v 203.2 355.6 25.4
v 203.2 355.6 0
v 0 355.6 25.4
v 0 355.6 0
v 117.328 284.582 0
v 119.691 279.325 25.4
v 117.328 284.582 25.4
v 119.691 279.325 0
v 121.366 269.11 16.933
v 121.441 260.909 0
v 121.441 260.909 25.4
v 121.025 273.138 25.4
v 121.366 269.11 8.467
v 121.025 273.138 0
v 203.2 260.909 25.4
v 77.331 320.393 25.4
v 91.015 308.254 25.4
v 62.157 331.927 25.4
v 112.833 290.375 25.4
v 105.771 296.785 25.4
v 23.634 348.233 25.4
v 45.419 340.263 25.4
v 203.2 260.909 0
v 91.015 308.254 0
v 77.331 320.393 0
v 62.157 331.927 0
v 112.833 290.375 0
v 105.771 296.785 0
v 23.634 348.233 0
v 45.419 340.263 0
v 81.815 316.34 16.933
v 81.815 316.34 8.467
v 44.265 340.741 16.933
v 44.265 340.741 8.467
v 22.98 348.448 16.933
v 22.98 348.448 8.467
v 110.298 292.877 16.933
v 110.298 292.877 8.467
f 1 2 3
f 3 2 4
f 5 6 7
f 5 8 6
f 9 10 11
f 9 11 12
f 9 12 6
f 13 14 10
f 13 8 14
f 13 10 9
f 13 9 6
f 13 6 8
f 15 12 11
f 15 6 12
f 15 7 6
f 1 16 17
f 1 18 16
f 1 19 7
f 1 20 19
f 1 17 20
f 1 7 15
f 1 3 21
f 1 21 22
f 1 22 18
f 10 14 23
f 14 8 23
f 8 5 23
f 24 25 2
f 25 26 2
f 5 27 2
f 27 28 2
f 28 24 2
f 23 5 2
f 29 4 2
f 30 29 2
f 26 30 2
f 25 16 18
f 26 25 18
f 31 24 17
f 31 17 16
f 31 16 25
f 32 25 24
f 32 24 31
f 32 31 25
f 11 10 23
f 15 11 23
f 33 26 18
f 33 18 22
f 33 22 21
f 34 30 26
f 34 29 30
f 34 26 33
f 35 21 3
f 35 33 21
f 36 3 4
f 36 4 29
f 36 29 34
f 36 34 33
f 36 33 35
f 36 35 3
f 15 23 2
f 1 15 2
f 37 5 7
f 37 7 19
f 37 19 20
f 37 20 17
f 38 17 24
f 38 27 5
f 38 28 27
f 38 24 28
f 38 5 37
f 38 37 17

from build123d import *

# Parameters (mm, degrees)
F1_DEPTH = 25.4


with BuildPart() as f1:
    # F0 (on Top) → F1 (new body)
    with BuildSketch(Plane.XY):
        with BuildLine():
            Line((62.1568927622, 331.9272), (203.2, 331.9272))
            Line((203.2, 331.9272), (203.2, 355.6))
            Line((203.2, 355.6), (0, 355.6))
            add(Edge.make_bspline(
                [(62.1568927622, 331.9272), (46.5258539889, 341.4800694919), (23.2629269944, 348.540034746), (0, 355.6)],
                knots=[0.6752877262, 0.6752877262, 0.6752877262, 0.6752877262, 1, 1, 1, 1], degree=3))
        make_face()
        with BuildLine():
            Line((91.0151283785, 308.2544), (203.2, 308.2544))
            Line((203.2, 308.2544), (203.2, 331.9272))
            Line((203.2, 331.9272), (62.1568927622, 331.9272))
            add(Edge.make_bspline(
                [(91.0151283785, 308.2544), (81.293107614, 316.2156971088), (73.8664451152, 324.7709369352), (62.1568927622, 331.9272)],
                knots=[0.4320386737, 0.4320386737, 0.4320386737, 0.4320386737, 0.6752877262, 0.6752877262, 0.6752877262, 0.6752877262], degree=3))
        make_face()
        with BuildLine():
            Line((117.3283786334, 284.5816), (203.2, 284.5816))
            Line((203.2, 284.5816), (203.2, 308.2544))
            Line((203.2, 308.2544), (91.0151283785, 308.2544))
            add(Edge.make_bspline(
                [(117.3283786334, 284.5816), (112.1261985969, 293.312325694), (100.4823531117, 300.5017536394), (91.0151283785, 308.2544)],
                knots=[0.1951647253, 0.1951647253, 0.1951647253, 0.1951647253, 0.4320386737, 0.4320386737, 0.4320386737, 0.4320386737], degree=3))
        make_face()
        with BuildLine():
            Line((121.441156018, 260.9088), (203.2, 260.9088))
            Line((203.2, 260.9088), (203.2, 284.5816))
            Line((203.2, 284.5816), (117.3283786334, 284.5816))
            add(Edge.make_bspline(
                [(121.441156018, 260.9088), (121.5278523804, 269.1484986902), (121.6145487428, 277.3881973804), (117.3283786334, 284.5816)],
                knots=[0, 0, 0, 0, 0.1951647253, 0.1951647253, 0.1951647253, 0.1951647253], degree=3))
        make_face()
    extrude(amount=F1_DEPTH)


solid = f1.part
